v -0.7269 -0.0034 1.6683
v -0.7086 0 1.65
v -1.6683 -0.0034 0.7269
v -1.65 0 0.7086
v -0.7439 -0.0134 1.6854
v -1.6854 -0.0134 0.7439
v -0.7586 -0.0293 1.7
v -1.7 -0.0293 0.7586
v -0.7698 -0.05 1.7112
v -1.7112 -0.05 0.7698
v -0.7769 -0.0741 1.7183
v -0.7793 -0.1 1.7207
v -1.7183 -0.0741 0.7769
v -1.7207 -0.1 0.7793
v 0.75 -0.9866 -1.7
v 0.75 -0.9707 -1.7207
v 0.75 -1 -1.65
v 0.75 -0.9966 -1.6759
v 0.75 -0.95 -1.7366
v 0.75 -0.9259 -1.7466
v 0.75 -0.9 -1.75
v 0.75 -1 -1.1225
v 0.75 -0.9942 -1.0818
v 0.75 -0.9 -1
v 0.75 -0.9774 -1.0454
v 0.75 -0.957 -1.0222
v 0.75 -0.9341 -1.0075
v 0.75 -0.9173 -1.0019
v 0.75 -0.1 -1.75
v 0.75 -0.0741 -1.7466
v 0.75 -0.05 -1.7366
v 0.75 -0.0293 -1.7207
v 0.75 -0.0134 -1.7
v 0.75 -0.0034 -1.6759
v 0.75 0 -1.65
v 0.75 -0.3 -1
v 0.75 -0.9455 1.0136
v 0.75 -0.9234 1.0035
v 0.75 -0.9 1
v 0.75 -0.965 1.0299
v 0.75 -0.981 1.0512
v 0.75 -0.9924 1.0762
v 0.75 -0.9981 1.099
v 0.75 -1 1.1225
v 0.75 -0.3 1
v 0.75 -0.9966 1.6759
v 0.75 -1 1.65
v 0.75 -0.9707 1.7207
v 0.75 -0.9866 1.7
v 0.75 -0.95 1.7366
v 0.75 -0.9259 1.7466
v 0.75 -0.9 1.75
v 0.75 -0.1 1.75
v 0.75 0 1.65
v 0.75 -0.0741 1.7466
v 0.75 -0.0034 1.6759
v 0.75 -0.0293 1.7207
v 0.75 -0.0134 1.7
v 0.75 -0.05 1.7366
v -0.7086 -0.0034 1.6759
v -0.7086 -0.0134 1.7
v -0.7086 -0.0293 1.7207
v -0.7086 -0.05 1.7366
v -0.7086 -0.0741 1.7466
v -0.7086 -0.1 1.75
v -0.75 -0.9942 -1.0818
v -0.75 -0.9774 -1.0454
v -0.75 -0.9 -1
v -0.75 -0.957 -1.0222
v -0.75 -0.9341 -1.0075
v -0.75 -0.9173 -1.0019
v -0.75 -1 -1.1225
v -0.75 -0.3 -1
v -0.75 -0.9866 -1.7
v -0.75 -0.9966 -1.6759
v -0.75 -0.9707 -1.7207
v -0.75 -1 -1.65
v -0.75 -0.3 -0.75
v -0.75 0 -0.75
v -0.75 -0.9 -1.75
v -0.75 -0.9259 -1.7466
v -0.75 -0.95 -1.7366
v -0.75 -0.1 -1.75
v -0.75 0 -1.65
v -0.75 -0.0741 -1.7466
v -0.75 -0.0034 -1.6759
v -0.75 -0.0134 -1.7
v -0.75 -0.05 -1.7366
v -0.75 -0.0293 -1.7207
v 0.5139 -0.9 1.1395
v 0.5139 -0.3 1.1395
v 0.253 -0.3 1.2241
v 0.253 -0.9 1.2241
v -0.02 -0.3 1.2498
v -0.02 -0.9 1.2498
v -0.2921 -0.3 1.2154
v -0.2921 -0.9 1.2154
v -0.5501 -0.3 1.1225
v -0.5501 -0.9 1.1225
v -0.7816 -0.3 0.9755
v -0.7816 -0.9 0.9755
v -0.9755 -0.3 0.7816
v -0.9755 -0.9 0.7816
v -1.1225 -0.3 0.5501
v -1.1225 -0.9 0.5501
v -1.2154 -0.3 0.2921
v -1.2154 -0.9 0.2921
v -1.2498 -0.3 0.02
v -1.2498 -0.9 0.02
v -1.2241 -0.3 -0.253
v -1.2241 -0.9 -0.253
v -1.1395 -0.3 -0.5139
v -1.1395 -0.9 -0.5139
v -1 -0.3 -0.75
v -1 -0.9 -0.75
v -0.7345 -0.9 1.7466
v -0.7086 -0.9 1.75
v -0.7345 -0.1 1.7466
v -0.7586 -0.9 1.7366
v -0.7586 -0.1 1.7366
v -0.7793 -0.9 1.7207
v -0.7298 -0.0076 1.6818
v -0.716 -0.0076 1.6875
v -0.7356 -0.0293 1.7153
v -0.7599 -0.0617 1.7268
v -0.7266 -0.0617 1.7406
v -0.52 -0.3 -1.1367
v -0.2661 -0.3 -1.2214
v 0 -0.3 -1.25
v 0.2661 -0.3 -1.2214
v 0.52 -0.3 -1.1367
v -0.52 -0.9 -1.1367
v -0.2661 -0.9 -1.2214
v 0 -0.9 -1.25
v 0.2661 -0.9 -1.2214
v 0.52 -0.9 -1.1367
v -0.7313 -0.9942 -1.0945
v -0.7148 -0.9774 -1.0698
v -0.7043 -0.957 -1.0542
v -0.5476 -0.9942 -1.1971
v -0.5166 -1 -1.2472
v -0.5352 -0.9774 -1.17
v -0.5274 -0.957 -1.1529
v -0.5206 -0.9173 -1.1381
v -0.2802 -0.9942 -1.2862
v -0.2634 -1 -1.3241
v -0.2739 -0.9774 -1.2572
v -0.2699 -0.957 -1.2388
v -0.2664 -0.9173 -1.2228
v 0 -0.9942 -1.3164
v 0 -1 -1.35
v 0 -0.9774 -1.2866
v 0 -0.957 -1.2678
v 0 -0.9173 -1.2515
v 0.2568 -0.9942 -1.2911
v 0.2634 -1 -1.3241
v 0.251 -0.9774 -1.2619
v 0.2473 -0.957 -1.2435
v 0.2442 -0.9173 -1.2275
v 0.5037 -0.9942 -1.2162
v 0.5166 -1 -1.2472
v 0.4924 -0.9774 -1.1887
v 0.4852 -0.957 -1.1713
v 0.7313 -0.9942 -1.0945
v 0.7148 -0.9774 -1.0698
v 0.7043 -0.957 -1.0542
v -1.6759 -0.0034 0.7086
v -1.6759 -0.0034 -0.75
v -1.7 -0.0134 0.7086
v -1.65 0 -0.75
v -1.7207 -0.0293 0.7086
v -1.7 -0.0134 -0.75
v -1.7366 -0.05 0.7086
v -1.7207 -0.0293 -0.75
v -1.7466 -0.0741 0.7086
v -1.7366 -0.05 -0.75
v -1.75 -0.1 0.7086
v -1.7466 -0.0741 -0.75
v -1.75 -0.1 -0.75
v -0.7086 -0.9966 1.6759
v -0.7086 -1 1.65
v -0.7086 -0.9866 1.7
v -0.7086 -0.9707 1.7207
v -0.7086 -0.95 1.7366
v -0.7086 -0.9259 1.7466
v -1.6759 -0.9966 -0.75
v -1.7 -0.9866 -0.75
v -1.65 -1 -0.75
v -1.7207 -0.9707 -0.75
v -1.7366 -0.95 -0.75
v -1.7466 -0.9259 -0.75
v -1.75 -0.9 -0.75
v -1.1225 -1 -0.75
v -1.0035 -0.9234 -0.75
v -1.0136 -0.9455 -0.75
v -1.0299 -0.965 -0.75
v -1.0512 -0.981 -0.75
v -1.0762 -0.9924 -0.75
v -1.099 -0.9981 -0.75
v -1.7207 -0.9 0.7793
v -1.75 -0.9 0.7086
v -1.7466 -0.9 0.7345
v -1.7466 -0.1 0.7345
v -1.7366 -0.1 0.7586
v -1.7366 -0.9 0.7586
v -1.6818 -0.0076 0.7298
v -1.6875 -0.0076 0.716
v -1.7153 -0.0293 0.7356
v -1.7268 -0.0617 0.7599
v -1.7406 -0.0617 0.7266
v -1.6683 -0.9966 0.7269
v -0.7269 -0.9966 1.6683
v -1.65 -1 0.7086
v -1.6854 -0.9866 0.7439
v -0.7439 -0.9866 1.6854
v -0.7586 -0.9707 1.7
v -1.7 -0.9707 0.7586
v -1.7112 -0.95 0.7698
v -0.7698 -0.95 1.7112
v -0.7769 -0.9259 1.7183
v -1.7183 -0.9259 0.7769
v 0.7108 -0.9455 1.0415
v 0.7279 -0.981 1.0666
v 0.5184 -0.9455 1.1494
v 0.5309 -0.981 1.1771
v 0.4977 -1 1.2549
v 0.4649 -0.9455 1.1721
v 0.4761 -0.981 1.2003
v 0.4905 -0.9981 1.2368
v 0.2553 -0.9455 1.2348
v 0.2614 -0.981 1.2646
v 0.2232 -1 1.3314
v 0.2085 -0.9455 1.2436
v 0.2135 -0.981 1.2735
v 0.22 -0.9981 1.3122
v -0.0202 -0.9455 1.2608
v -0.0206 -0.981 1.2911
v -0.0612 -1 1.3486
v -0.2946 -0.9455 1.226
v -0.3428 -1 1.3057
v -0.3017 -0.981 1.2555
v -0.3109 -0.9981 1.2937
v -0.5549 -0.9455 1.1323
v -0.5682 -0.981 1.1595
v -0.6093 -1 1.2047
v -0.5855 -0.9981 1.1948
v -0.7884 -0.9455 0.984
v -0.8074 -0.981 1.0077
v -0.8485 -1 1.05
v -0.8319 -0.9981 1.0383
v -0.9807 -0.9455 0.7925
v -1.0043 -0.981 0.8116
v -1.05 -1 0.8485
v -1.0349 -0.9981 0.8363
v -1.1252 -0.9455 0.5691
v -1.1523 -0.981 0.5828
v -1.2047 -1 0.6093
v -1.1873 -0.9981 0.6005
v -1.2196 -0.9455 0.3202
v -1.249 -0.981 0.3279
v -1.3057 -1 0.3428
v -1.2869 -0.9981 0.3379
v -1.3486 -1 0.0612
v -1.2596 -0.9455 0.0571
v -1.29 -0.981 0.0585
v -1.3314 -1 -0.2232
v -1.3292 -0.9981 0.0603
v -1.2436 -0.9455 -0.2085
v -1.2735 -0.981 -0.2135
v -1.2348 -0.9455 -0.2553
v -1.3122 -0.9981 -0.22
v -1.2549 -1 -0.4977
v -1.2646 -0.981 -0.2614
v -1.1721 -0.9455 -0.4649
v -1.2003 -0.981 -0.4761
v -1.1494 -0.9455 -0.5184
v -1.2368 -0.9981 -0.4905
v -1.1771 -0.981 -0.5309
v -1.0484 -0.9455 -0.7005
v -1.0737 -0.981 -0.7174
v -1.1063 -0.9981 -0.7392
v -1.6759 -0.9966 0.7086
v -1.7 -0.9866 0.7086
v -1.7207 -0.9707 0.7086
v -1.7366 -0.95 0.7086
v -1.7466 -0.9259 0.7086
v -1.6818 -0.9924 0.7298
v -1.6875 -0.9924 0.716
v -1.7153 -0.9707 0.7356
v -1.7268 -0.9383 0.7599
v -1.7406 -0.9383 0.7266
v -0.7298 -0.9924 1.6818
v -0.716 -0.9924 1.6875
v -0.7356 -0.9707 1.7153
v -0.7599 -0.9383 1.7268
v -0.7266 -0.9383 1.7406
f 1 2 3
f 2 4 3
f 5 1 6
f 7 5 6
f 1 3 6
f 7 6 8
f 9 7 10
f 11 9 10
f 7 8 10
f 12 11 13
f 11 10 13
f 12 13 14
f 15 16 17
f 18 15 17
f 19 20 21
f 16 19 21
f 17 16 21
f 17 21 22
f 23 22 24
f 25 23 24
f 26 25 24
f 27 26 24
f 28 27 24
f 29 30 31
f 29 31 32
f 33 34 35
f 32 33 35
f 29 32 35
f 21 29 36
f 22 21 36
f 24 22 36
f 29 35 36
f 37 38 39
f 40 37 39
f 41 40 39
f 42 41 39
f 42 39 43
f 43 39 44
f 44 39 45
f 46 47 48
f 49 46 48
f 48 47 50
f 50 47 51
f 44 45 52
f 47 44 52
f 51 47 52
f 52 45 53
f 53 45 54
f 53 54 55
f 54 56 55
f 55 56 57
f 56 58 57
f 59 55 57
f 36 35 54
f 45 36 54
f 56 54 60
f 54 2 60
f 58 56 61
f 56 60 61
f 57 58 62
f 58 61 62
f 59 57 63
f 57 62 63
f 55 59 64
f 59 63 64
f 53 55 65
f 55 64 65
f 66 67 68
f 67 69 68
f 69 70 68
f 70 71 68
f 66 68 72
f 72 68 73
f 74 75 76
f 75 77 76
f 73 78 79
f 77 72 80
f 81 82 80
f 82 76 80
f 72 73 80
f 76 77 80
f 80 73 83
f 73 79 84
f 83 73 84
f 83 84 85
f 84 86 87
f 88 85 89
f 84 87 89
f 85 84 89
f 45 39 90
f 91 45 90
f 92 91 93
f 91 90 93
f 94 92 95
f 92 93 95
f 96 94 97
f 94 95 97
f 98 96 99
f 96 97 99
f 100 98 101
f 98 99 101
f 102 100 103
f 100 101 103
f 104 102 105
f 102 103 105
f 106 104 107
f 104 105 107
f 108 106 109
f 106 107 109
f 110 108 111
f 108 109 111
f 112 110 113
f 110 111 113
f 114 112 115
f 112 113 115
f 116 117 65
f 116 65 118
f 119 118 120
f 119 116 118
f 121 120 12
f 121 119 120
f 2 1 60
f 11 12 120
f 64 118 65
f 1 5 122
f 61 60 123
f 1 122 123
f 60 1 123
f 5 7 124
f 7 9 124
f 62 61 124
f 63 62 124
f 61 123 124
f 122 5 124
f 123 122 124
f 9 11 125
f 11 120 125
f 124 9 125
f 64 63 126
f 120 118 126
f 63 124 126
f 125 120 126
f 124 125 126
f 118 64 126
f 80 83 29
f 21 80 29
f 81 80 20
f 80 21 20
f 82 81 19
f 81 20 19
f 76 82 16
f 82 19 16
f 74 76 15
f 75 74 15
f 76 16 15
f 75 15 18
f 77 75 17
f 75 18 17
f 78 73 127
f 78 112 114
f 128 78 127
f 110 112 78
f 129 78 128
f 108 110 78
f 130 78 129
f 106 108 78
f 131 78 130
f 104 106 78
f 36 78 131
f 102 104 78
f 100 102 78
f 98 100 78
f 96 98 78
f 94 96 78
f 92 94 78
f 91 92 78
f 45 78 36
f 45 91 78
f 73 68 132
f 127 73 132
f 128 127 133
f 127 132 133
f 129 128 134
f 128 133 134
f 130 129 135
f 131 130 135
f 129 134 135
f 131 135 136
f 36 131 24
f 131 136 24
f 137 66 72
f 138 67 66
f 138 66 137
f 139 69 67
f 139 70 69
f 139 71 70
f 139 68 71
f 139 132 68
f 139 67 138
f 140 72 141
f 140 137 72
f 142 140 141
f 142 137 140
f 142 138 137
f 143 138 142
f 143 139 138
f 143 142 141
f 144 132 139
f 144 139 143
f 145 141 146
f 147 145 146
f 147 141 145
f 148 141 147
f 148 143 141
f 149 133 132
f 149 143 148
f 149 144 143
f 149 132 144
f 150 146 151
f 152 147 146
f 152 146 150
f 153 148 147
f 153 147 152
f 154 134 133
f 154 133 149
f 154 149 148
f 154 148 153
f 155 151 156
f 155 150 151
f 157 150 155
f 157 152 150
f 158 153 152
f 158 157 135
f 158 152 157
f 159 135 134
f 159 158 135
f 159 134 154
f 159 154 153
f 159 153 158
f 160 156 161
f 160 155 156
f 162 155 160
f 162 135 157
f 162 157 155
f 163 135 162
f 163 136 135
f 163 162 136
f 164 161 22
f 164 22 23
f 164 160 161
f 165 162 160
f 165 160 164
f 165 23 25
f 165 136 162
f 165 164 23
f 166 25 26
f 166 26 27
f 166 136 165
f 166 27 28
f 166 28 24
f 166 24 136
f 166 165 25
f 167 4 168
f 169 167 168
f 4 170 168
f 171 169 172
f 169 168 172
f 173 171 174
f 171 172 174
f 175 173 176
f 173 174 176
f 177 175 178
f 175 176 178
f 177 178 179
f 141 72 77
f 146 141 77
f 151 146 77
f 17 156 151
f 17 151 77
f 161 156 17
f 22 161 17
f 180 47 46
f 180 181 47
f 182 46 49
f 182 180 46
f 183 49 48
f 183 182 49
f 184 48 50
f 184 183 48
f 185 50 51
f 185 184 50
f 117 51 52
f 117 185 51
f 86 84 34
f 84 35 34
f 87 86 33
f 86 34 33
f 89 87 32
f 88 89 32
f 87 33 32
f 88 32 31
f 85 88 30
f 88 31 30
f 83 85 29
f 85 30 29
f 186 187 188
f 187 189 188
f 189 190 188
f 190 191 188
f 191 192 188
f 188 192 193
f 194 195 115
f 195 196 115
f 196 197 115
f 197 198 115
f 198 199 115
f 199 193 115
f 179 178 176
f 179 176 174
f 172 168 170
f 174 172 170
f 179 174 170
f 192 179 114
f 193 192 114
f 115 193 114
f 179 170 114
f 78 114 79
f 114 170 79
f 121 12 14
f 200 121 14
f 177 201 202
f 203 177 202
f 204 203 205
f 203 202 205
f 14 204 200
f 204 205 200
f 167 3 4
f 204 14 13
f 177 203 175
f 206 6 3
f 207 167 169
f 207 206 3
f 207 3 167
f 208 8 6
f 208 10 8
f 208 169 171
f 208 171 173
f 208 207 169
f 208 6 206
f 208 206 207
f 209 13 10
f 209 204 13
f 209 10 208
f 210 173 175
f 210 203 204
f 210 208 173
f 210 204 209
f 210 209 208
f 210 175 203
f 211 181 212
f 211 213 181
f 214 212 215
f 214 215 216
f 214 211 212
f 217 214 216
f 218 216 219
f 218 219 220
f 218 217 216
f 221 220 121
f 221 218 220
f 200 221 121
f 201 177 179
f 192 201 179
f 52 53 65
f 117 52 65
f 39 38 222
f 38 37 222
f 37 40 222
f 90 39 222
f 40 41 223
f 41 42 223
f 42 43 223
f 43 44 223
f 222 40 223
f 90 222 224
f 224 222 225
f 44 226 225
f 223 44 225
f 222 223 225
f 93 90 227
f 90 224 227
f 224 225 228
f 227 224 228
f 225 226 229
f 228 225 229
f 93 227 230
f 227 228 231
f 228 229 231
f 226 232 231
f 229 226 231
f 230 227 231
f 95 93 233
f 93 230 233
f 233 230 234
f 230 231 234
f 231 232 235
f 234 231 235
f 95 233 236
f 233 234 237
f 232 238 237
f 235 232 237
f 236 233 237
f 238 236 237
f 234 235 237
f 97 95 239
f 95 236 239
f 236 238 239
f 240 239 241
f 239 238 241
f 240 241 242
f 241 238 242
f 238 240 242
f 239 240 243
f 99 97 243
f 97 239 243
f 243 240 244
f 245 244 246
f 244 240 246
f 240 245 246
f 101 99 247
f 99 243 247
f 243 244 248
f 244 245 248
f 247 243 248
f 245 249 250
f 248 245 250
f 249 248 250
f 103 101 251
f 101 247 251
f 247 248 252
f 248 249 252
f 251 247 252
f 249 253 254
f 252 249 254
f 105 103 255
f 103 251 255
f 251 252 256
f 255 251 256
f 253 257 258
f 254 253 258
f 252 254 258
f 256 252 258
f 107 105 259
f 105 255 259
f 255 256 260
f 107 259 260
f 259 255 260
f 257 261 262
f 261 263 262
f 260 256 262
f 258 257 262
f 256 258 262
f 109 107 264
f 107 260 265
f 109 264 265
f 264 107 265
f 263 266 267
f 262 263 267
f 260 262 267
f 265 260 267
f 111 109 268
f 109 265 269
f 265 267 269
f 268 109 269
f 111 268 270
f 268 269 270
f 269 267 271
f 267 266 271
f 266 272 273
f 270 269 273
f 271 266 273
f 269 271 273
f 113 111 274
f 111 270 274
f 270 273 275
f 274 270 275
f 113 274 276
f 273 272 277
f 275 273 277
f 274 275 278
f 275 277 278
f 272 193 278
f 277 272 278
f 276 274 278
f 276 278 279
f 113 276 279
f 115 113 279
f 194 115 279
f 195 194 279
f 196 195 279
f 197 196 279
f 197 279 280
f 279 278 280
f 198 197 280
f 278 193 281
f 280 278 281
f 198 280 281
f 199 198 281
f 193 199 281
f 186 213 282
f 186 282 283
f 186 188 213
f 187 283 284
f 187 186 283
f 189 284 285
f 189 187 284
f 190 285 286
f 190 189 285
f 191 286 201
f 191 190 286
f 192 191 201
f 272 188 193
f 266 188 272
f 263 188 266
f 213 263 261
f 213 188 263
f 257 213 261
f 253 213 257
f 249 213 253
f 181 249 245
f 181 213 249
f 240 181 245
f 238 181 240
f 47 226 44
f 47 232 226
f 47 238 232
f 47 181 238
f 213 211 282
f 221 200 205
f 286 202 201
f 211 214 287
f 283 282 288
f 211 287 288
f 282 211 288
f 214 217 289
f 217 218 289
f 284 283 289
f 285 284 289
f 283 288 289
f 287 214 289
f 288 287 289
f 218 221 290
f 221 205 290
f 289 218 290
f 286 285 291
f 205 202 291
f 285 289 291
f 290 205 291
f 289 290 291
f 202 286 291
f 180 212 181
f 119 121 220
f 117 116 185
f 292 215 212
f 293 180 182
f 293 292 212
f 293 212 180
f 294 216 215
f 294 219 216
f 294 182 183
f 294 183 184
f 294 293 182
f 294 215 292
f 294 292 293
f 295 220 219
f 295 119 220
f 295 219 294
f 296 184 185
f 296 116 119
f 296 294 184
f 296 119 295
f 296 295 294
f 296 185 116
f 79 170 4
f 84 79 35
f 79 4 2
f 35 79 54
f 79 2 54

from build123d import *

# Parameters (mm, degrees)
F1_DEPTH = 1
F3_DEPTH = 0.7
F4_R     = 0.1


with BuildPart() as f1:
    # F0 (on Front) → F1 (new body)
    with BuildSketch(Plane.XZ):
        with BuildLine():
            Line((-1.75, -0.75), (-1, -0.75))
            ThreePointArc((-1, -0.75), (-0.8838834765, 0.8838834765), (0.75, 1))
            Line((0.75, 1), (0.75, 1.75))
            Line((0.75, 1.75), (-0.75, 1.75))
            Line((-0.75, 1.75), (-1.75, 0.75))
            Line((-1.75, 0.75), (-1.75, -0.75))
        make_face()
        with BuildLine():
            ThreePointArc((0.75, -1), (0, -1.25), (-0.75, -1))
            Line((-0.75, -1), (-0.75, -1.75))
            Line((-0.75, -1.75), (0.75, -1.75))
            Line((0.75, -1.75), (0.75, -1))
        make_face()
        with BuildLine():
            Line((-1, -0.75), (-0.75, -0.75))
            Line((-0.75, -0.75), (-0.75, -1))
            ThreePointArc((-0.75, -1), (0, -1.25), (0.75, -1))
            Line((0.75, -1), (0.75, 1))
            ThreePointArc((0.75, 1), (-0.8838834765, 0.8838834765), (-1, -0.75))
        make_face()
    extrude(amount=F1_DEPTH)

    # F2 (on face) → F3 (cut)
    with BuildSketch(Plane.XZ.offset(1)):
        with BuildLine():
            ThreePointArc((0.75, -1), (1.1180339887, -0.5590169944), (1.25, 0))
            ThreePointArc((1.25, 0), (1.1180339887, 0.5590169944), (0.75, 1))
            Line((0.75, 1), (0.75, -1))
        make_face()
        with BuildLine():
            Line((-0.75, -0.75), (-1, -0.75))
            ThreePointArc((-1, -0.75), (-0.8838834765, -0.8838834765), (-0.75, -1))
            Line((-0.75, -1), (-0.75, -0.75))
        make_face()
        with BuildLine():
            Line((0.75, -1), (0.75, 1))
            ThreePointArc((0.75, 1), (-0.8838834765, 0.8838834765), (-1, -0.75))
            Line((-1, -0.75), (-0.75, -0.75))
            Line((-0.75, -0.75), (-0.75, -1))
            ThreePointArc((-0.75, -1), (0, -1.25), (0.75, -1))
        make_face()
    extrude(amount=-F3_DEPTH, mode=Mode.SUBTRACT)

    # F4
    f4_edges = [f1.edges().sort_by_distance(p)[0] for p in [
        (0, 0, 1.75),
        (0, -1, 1.75),
        (-0.75, -0.5, 1.75),
        (-0.883883, -1, 0.883883),
        (0, -1, -1.25),
        (-1.25, -1, 1.25),
        (-1.25, 0, 1.25),
        (-1.75, -1, 0),
        (-1.75, 0, 0),
        (-1.75, -0.5, 0.75),
        (0, -1, -1.75),
        (0, 0, -1.75),
    ]]
    fillet(f4_edges, radius=F4_R)


solid = f1.part
